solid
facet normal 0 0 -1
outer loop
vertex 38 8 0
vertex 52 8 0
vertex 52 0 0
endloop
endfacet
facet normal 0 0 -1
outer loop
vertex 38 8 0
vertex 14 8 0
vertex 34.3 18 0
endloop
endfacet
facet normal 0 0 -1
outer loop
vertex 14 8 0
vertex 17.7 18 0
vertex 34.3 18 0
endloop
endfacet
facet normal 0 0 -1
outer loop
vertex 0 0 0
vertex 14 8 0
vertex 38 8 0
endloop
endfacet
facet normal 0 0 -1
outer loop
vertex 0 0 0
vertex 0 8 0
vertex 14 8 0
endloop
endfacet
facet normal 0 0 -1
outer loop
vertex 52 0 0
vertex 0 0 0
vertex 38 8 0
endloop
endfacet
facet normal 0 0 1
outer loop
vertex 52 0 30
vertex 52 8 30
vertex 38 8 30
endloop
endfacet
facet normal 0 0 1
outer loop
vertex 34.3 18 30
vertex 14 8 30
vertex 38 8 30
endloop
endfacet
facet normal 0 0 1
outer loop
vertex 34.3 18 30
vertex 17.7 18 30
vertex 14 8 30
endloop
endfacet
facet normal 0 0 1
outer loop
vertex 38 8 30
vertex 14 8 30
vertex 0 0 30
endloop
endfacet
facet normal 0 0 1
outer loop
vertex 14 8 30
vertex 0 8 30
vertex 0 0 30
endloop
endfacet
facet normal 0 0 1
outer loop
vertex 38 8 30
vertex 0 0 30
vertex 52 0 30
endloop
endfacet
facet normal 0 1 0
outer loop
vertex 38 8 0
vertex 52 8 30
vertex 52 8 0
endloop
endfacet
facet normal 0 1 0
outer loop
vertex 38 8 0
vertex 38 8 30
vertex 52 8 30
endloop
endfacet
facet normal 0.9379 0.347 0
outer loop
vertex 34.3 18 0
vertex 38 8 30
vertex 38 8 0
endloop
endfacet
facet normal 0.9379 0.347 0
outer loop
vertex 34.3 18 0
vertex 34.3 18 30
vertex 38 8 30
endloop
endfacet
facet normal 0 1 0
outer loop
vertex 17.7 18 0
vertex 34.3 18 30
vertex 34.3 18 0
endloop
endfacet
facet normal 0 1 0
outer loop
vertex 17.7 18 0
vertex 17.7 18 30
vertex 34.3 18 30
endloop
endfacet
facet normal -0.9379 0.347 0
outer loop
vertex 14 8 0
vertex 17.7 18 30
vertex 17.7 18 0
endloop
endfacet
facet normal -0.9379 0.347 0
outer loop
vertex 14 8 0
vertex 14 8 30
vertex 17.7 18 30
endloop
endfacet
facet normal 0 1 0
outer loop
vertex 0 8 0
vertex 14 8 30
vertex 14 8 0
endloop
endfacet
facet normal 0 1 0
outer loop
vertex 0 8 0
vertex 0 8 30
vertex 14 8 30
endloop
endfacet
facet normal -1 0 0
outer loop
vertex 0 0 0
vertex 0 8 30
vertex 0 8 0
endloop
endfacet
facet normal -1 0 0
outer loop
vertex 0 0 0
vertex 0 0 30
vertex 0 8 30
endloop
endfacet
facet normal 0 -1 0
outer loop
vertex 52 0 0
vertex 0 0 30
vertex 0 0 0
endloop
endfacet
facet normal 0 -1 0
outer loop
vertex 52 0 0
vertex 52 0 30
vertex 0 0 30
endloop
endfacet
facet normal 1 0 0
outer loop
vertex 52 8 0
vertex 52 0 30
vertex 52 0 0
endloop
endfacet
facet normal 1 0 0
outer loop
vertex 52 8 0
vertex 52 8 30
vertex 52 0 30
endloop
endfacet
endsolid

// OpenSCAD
$fn = 32;

// ----------------------------------------------------------------------
// V guide rail: dovetail, 52 mm wide
// ----------------------------------------------------------------------

// --- parameters (mm) ---
rail_w = 52;              // rail width, X
base_t = 8;               // base plate thickness
v_depth = 10;             // V feature depth / height
v_half_w = 12;            // half width of the V at the base face
plate_t = 30;             // rail length, Z (the extrusion height)
top_half_w = 8.3;         // half width at the dovetail top

dovetail_base = 2 * v_half_w;  // dovetail width at the base
dovetail_top = 2 * top_half_w;  // dovetail width at the top

profile = [[0, 0], [52, 0], [52, 8], [38, 8], [34.3, 18], [17.7, 18], [14, 8], [0, 8]];  // primary outline, 8 points, counter clockwise

// --- the one profile operation ---
linear_extrude(height = plate_t) polygon(points = profile);
